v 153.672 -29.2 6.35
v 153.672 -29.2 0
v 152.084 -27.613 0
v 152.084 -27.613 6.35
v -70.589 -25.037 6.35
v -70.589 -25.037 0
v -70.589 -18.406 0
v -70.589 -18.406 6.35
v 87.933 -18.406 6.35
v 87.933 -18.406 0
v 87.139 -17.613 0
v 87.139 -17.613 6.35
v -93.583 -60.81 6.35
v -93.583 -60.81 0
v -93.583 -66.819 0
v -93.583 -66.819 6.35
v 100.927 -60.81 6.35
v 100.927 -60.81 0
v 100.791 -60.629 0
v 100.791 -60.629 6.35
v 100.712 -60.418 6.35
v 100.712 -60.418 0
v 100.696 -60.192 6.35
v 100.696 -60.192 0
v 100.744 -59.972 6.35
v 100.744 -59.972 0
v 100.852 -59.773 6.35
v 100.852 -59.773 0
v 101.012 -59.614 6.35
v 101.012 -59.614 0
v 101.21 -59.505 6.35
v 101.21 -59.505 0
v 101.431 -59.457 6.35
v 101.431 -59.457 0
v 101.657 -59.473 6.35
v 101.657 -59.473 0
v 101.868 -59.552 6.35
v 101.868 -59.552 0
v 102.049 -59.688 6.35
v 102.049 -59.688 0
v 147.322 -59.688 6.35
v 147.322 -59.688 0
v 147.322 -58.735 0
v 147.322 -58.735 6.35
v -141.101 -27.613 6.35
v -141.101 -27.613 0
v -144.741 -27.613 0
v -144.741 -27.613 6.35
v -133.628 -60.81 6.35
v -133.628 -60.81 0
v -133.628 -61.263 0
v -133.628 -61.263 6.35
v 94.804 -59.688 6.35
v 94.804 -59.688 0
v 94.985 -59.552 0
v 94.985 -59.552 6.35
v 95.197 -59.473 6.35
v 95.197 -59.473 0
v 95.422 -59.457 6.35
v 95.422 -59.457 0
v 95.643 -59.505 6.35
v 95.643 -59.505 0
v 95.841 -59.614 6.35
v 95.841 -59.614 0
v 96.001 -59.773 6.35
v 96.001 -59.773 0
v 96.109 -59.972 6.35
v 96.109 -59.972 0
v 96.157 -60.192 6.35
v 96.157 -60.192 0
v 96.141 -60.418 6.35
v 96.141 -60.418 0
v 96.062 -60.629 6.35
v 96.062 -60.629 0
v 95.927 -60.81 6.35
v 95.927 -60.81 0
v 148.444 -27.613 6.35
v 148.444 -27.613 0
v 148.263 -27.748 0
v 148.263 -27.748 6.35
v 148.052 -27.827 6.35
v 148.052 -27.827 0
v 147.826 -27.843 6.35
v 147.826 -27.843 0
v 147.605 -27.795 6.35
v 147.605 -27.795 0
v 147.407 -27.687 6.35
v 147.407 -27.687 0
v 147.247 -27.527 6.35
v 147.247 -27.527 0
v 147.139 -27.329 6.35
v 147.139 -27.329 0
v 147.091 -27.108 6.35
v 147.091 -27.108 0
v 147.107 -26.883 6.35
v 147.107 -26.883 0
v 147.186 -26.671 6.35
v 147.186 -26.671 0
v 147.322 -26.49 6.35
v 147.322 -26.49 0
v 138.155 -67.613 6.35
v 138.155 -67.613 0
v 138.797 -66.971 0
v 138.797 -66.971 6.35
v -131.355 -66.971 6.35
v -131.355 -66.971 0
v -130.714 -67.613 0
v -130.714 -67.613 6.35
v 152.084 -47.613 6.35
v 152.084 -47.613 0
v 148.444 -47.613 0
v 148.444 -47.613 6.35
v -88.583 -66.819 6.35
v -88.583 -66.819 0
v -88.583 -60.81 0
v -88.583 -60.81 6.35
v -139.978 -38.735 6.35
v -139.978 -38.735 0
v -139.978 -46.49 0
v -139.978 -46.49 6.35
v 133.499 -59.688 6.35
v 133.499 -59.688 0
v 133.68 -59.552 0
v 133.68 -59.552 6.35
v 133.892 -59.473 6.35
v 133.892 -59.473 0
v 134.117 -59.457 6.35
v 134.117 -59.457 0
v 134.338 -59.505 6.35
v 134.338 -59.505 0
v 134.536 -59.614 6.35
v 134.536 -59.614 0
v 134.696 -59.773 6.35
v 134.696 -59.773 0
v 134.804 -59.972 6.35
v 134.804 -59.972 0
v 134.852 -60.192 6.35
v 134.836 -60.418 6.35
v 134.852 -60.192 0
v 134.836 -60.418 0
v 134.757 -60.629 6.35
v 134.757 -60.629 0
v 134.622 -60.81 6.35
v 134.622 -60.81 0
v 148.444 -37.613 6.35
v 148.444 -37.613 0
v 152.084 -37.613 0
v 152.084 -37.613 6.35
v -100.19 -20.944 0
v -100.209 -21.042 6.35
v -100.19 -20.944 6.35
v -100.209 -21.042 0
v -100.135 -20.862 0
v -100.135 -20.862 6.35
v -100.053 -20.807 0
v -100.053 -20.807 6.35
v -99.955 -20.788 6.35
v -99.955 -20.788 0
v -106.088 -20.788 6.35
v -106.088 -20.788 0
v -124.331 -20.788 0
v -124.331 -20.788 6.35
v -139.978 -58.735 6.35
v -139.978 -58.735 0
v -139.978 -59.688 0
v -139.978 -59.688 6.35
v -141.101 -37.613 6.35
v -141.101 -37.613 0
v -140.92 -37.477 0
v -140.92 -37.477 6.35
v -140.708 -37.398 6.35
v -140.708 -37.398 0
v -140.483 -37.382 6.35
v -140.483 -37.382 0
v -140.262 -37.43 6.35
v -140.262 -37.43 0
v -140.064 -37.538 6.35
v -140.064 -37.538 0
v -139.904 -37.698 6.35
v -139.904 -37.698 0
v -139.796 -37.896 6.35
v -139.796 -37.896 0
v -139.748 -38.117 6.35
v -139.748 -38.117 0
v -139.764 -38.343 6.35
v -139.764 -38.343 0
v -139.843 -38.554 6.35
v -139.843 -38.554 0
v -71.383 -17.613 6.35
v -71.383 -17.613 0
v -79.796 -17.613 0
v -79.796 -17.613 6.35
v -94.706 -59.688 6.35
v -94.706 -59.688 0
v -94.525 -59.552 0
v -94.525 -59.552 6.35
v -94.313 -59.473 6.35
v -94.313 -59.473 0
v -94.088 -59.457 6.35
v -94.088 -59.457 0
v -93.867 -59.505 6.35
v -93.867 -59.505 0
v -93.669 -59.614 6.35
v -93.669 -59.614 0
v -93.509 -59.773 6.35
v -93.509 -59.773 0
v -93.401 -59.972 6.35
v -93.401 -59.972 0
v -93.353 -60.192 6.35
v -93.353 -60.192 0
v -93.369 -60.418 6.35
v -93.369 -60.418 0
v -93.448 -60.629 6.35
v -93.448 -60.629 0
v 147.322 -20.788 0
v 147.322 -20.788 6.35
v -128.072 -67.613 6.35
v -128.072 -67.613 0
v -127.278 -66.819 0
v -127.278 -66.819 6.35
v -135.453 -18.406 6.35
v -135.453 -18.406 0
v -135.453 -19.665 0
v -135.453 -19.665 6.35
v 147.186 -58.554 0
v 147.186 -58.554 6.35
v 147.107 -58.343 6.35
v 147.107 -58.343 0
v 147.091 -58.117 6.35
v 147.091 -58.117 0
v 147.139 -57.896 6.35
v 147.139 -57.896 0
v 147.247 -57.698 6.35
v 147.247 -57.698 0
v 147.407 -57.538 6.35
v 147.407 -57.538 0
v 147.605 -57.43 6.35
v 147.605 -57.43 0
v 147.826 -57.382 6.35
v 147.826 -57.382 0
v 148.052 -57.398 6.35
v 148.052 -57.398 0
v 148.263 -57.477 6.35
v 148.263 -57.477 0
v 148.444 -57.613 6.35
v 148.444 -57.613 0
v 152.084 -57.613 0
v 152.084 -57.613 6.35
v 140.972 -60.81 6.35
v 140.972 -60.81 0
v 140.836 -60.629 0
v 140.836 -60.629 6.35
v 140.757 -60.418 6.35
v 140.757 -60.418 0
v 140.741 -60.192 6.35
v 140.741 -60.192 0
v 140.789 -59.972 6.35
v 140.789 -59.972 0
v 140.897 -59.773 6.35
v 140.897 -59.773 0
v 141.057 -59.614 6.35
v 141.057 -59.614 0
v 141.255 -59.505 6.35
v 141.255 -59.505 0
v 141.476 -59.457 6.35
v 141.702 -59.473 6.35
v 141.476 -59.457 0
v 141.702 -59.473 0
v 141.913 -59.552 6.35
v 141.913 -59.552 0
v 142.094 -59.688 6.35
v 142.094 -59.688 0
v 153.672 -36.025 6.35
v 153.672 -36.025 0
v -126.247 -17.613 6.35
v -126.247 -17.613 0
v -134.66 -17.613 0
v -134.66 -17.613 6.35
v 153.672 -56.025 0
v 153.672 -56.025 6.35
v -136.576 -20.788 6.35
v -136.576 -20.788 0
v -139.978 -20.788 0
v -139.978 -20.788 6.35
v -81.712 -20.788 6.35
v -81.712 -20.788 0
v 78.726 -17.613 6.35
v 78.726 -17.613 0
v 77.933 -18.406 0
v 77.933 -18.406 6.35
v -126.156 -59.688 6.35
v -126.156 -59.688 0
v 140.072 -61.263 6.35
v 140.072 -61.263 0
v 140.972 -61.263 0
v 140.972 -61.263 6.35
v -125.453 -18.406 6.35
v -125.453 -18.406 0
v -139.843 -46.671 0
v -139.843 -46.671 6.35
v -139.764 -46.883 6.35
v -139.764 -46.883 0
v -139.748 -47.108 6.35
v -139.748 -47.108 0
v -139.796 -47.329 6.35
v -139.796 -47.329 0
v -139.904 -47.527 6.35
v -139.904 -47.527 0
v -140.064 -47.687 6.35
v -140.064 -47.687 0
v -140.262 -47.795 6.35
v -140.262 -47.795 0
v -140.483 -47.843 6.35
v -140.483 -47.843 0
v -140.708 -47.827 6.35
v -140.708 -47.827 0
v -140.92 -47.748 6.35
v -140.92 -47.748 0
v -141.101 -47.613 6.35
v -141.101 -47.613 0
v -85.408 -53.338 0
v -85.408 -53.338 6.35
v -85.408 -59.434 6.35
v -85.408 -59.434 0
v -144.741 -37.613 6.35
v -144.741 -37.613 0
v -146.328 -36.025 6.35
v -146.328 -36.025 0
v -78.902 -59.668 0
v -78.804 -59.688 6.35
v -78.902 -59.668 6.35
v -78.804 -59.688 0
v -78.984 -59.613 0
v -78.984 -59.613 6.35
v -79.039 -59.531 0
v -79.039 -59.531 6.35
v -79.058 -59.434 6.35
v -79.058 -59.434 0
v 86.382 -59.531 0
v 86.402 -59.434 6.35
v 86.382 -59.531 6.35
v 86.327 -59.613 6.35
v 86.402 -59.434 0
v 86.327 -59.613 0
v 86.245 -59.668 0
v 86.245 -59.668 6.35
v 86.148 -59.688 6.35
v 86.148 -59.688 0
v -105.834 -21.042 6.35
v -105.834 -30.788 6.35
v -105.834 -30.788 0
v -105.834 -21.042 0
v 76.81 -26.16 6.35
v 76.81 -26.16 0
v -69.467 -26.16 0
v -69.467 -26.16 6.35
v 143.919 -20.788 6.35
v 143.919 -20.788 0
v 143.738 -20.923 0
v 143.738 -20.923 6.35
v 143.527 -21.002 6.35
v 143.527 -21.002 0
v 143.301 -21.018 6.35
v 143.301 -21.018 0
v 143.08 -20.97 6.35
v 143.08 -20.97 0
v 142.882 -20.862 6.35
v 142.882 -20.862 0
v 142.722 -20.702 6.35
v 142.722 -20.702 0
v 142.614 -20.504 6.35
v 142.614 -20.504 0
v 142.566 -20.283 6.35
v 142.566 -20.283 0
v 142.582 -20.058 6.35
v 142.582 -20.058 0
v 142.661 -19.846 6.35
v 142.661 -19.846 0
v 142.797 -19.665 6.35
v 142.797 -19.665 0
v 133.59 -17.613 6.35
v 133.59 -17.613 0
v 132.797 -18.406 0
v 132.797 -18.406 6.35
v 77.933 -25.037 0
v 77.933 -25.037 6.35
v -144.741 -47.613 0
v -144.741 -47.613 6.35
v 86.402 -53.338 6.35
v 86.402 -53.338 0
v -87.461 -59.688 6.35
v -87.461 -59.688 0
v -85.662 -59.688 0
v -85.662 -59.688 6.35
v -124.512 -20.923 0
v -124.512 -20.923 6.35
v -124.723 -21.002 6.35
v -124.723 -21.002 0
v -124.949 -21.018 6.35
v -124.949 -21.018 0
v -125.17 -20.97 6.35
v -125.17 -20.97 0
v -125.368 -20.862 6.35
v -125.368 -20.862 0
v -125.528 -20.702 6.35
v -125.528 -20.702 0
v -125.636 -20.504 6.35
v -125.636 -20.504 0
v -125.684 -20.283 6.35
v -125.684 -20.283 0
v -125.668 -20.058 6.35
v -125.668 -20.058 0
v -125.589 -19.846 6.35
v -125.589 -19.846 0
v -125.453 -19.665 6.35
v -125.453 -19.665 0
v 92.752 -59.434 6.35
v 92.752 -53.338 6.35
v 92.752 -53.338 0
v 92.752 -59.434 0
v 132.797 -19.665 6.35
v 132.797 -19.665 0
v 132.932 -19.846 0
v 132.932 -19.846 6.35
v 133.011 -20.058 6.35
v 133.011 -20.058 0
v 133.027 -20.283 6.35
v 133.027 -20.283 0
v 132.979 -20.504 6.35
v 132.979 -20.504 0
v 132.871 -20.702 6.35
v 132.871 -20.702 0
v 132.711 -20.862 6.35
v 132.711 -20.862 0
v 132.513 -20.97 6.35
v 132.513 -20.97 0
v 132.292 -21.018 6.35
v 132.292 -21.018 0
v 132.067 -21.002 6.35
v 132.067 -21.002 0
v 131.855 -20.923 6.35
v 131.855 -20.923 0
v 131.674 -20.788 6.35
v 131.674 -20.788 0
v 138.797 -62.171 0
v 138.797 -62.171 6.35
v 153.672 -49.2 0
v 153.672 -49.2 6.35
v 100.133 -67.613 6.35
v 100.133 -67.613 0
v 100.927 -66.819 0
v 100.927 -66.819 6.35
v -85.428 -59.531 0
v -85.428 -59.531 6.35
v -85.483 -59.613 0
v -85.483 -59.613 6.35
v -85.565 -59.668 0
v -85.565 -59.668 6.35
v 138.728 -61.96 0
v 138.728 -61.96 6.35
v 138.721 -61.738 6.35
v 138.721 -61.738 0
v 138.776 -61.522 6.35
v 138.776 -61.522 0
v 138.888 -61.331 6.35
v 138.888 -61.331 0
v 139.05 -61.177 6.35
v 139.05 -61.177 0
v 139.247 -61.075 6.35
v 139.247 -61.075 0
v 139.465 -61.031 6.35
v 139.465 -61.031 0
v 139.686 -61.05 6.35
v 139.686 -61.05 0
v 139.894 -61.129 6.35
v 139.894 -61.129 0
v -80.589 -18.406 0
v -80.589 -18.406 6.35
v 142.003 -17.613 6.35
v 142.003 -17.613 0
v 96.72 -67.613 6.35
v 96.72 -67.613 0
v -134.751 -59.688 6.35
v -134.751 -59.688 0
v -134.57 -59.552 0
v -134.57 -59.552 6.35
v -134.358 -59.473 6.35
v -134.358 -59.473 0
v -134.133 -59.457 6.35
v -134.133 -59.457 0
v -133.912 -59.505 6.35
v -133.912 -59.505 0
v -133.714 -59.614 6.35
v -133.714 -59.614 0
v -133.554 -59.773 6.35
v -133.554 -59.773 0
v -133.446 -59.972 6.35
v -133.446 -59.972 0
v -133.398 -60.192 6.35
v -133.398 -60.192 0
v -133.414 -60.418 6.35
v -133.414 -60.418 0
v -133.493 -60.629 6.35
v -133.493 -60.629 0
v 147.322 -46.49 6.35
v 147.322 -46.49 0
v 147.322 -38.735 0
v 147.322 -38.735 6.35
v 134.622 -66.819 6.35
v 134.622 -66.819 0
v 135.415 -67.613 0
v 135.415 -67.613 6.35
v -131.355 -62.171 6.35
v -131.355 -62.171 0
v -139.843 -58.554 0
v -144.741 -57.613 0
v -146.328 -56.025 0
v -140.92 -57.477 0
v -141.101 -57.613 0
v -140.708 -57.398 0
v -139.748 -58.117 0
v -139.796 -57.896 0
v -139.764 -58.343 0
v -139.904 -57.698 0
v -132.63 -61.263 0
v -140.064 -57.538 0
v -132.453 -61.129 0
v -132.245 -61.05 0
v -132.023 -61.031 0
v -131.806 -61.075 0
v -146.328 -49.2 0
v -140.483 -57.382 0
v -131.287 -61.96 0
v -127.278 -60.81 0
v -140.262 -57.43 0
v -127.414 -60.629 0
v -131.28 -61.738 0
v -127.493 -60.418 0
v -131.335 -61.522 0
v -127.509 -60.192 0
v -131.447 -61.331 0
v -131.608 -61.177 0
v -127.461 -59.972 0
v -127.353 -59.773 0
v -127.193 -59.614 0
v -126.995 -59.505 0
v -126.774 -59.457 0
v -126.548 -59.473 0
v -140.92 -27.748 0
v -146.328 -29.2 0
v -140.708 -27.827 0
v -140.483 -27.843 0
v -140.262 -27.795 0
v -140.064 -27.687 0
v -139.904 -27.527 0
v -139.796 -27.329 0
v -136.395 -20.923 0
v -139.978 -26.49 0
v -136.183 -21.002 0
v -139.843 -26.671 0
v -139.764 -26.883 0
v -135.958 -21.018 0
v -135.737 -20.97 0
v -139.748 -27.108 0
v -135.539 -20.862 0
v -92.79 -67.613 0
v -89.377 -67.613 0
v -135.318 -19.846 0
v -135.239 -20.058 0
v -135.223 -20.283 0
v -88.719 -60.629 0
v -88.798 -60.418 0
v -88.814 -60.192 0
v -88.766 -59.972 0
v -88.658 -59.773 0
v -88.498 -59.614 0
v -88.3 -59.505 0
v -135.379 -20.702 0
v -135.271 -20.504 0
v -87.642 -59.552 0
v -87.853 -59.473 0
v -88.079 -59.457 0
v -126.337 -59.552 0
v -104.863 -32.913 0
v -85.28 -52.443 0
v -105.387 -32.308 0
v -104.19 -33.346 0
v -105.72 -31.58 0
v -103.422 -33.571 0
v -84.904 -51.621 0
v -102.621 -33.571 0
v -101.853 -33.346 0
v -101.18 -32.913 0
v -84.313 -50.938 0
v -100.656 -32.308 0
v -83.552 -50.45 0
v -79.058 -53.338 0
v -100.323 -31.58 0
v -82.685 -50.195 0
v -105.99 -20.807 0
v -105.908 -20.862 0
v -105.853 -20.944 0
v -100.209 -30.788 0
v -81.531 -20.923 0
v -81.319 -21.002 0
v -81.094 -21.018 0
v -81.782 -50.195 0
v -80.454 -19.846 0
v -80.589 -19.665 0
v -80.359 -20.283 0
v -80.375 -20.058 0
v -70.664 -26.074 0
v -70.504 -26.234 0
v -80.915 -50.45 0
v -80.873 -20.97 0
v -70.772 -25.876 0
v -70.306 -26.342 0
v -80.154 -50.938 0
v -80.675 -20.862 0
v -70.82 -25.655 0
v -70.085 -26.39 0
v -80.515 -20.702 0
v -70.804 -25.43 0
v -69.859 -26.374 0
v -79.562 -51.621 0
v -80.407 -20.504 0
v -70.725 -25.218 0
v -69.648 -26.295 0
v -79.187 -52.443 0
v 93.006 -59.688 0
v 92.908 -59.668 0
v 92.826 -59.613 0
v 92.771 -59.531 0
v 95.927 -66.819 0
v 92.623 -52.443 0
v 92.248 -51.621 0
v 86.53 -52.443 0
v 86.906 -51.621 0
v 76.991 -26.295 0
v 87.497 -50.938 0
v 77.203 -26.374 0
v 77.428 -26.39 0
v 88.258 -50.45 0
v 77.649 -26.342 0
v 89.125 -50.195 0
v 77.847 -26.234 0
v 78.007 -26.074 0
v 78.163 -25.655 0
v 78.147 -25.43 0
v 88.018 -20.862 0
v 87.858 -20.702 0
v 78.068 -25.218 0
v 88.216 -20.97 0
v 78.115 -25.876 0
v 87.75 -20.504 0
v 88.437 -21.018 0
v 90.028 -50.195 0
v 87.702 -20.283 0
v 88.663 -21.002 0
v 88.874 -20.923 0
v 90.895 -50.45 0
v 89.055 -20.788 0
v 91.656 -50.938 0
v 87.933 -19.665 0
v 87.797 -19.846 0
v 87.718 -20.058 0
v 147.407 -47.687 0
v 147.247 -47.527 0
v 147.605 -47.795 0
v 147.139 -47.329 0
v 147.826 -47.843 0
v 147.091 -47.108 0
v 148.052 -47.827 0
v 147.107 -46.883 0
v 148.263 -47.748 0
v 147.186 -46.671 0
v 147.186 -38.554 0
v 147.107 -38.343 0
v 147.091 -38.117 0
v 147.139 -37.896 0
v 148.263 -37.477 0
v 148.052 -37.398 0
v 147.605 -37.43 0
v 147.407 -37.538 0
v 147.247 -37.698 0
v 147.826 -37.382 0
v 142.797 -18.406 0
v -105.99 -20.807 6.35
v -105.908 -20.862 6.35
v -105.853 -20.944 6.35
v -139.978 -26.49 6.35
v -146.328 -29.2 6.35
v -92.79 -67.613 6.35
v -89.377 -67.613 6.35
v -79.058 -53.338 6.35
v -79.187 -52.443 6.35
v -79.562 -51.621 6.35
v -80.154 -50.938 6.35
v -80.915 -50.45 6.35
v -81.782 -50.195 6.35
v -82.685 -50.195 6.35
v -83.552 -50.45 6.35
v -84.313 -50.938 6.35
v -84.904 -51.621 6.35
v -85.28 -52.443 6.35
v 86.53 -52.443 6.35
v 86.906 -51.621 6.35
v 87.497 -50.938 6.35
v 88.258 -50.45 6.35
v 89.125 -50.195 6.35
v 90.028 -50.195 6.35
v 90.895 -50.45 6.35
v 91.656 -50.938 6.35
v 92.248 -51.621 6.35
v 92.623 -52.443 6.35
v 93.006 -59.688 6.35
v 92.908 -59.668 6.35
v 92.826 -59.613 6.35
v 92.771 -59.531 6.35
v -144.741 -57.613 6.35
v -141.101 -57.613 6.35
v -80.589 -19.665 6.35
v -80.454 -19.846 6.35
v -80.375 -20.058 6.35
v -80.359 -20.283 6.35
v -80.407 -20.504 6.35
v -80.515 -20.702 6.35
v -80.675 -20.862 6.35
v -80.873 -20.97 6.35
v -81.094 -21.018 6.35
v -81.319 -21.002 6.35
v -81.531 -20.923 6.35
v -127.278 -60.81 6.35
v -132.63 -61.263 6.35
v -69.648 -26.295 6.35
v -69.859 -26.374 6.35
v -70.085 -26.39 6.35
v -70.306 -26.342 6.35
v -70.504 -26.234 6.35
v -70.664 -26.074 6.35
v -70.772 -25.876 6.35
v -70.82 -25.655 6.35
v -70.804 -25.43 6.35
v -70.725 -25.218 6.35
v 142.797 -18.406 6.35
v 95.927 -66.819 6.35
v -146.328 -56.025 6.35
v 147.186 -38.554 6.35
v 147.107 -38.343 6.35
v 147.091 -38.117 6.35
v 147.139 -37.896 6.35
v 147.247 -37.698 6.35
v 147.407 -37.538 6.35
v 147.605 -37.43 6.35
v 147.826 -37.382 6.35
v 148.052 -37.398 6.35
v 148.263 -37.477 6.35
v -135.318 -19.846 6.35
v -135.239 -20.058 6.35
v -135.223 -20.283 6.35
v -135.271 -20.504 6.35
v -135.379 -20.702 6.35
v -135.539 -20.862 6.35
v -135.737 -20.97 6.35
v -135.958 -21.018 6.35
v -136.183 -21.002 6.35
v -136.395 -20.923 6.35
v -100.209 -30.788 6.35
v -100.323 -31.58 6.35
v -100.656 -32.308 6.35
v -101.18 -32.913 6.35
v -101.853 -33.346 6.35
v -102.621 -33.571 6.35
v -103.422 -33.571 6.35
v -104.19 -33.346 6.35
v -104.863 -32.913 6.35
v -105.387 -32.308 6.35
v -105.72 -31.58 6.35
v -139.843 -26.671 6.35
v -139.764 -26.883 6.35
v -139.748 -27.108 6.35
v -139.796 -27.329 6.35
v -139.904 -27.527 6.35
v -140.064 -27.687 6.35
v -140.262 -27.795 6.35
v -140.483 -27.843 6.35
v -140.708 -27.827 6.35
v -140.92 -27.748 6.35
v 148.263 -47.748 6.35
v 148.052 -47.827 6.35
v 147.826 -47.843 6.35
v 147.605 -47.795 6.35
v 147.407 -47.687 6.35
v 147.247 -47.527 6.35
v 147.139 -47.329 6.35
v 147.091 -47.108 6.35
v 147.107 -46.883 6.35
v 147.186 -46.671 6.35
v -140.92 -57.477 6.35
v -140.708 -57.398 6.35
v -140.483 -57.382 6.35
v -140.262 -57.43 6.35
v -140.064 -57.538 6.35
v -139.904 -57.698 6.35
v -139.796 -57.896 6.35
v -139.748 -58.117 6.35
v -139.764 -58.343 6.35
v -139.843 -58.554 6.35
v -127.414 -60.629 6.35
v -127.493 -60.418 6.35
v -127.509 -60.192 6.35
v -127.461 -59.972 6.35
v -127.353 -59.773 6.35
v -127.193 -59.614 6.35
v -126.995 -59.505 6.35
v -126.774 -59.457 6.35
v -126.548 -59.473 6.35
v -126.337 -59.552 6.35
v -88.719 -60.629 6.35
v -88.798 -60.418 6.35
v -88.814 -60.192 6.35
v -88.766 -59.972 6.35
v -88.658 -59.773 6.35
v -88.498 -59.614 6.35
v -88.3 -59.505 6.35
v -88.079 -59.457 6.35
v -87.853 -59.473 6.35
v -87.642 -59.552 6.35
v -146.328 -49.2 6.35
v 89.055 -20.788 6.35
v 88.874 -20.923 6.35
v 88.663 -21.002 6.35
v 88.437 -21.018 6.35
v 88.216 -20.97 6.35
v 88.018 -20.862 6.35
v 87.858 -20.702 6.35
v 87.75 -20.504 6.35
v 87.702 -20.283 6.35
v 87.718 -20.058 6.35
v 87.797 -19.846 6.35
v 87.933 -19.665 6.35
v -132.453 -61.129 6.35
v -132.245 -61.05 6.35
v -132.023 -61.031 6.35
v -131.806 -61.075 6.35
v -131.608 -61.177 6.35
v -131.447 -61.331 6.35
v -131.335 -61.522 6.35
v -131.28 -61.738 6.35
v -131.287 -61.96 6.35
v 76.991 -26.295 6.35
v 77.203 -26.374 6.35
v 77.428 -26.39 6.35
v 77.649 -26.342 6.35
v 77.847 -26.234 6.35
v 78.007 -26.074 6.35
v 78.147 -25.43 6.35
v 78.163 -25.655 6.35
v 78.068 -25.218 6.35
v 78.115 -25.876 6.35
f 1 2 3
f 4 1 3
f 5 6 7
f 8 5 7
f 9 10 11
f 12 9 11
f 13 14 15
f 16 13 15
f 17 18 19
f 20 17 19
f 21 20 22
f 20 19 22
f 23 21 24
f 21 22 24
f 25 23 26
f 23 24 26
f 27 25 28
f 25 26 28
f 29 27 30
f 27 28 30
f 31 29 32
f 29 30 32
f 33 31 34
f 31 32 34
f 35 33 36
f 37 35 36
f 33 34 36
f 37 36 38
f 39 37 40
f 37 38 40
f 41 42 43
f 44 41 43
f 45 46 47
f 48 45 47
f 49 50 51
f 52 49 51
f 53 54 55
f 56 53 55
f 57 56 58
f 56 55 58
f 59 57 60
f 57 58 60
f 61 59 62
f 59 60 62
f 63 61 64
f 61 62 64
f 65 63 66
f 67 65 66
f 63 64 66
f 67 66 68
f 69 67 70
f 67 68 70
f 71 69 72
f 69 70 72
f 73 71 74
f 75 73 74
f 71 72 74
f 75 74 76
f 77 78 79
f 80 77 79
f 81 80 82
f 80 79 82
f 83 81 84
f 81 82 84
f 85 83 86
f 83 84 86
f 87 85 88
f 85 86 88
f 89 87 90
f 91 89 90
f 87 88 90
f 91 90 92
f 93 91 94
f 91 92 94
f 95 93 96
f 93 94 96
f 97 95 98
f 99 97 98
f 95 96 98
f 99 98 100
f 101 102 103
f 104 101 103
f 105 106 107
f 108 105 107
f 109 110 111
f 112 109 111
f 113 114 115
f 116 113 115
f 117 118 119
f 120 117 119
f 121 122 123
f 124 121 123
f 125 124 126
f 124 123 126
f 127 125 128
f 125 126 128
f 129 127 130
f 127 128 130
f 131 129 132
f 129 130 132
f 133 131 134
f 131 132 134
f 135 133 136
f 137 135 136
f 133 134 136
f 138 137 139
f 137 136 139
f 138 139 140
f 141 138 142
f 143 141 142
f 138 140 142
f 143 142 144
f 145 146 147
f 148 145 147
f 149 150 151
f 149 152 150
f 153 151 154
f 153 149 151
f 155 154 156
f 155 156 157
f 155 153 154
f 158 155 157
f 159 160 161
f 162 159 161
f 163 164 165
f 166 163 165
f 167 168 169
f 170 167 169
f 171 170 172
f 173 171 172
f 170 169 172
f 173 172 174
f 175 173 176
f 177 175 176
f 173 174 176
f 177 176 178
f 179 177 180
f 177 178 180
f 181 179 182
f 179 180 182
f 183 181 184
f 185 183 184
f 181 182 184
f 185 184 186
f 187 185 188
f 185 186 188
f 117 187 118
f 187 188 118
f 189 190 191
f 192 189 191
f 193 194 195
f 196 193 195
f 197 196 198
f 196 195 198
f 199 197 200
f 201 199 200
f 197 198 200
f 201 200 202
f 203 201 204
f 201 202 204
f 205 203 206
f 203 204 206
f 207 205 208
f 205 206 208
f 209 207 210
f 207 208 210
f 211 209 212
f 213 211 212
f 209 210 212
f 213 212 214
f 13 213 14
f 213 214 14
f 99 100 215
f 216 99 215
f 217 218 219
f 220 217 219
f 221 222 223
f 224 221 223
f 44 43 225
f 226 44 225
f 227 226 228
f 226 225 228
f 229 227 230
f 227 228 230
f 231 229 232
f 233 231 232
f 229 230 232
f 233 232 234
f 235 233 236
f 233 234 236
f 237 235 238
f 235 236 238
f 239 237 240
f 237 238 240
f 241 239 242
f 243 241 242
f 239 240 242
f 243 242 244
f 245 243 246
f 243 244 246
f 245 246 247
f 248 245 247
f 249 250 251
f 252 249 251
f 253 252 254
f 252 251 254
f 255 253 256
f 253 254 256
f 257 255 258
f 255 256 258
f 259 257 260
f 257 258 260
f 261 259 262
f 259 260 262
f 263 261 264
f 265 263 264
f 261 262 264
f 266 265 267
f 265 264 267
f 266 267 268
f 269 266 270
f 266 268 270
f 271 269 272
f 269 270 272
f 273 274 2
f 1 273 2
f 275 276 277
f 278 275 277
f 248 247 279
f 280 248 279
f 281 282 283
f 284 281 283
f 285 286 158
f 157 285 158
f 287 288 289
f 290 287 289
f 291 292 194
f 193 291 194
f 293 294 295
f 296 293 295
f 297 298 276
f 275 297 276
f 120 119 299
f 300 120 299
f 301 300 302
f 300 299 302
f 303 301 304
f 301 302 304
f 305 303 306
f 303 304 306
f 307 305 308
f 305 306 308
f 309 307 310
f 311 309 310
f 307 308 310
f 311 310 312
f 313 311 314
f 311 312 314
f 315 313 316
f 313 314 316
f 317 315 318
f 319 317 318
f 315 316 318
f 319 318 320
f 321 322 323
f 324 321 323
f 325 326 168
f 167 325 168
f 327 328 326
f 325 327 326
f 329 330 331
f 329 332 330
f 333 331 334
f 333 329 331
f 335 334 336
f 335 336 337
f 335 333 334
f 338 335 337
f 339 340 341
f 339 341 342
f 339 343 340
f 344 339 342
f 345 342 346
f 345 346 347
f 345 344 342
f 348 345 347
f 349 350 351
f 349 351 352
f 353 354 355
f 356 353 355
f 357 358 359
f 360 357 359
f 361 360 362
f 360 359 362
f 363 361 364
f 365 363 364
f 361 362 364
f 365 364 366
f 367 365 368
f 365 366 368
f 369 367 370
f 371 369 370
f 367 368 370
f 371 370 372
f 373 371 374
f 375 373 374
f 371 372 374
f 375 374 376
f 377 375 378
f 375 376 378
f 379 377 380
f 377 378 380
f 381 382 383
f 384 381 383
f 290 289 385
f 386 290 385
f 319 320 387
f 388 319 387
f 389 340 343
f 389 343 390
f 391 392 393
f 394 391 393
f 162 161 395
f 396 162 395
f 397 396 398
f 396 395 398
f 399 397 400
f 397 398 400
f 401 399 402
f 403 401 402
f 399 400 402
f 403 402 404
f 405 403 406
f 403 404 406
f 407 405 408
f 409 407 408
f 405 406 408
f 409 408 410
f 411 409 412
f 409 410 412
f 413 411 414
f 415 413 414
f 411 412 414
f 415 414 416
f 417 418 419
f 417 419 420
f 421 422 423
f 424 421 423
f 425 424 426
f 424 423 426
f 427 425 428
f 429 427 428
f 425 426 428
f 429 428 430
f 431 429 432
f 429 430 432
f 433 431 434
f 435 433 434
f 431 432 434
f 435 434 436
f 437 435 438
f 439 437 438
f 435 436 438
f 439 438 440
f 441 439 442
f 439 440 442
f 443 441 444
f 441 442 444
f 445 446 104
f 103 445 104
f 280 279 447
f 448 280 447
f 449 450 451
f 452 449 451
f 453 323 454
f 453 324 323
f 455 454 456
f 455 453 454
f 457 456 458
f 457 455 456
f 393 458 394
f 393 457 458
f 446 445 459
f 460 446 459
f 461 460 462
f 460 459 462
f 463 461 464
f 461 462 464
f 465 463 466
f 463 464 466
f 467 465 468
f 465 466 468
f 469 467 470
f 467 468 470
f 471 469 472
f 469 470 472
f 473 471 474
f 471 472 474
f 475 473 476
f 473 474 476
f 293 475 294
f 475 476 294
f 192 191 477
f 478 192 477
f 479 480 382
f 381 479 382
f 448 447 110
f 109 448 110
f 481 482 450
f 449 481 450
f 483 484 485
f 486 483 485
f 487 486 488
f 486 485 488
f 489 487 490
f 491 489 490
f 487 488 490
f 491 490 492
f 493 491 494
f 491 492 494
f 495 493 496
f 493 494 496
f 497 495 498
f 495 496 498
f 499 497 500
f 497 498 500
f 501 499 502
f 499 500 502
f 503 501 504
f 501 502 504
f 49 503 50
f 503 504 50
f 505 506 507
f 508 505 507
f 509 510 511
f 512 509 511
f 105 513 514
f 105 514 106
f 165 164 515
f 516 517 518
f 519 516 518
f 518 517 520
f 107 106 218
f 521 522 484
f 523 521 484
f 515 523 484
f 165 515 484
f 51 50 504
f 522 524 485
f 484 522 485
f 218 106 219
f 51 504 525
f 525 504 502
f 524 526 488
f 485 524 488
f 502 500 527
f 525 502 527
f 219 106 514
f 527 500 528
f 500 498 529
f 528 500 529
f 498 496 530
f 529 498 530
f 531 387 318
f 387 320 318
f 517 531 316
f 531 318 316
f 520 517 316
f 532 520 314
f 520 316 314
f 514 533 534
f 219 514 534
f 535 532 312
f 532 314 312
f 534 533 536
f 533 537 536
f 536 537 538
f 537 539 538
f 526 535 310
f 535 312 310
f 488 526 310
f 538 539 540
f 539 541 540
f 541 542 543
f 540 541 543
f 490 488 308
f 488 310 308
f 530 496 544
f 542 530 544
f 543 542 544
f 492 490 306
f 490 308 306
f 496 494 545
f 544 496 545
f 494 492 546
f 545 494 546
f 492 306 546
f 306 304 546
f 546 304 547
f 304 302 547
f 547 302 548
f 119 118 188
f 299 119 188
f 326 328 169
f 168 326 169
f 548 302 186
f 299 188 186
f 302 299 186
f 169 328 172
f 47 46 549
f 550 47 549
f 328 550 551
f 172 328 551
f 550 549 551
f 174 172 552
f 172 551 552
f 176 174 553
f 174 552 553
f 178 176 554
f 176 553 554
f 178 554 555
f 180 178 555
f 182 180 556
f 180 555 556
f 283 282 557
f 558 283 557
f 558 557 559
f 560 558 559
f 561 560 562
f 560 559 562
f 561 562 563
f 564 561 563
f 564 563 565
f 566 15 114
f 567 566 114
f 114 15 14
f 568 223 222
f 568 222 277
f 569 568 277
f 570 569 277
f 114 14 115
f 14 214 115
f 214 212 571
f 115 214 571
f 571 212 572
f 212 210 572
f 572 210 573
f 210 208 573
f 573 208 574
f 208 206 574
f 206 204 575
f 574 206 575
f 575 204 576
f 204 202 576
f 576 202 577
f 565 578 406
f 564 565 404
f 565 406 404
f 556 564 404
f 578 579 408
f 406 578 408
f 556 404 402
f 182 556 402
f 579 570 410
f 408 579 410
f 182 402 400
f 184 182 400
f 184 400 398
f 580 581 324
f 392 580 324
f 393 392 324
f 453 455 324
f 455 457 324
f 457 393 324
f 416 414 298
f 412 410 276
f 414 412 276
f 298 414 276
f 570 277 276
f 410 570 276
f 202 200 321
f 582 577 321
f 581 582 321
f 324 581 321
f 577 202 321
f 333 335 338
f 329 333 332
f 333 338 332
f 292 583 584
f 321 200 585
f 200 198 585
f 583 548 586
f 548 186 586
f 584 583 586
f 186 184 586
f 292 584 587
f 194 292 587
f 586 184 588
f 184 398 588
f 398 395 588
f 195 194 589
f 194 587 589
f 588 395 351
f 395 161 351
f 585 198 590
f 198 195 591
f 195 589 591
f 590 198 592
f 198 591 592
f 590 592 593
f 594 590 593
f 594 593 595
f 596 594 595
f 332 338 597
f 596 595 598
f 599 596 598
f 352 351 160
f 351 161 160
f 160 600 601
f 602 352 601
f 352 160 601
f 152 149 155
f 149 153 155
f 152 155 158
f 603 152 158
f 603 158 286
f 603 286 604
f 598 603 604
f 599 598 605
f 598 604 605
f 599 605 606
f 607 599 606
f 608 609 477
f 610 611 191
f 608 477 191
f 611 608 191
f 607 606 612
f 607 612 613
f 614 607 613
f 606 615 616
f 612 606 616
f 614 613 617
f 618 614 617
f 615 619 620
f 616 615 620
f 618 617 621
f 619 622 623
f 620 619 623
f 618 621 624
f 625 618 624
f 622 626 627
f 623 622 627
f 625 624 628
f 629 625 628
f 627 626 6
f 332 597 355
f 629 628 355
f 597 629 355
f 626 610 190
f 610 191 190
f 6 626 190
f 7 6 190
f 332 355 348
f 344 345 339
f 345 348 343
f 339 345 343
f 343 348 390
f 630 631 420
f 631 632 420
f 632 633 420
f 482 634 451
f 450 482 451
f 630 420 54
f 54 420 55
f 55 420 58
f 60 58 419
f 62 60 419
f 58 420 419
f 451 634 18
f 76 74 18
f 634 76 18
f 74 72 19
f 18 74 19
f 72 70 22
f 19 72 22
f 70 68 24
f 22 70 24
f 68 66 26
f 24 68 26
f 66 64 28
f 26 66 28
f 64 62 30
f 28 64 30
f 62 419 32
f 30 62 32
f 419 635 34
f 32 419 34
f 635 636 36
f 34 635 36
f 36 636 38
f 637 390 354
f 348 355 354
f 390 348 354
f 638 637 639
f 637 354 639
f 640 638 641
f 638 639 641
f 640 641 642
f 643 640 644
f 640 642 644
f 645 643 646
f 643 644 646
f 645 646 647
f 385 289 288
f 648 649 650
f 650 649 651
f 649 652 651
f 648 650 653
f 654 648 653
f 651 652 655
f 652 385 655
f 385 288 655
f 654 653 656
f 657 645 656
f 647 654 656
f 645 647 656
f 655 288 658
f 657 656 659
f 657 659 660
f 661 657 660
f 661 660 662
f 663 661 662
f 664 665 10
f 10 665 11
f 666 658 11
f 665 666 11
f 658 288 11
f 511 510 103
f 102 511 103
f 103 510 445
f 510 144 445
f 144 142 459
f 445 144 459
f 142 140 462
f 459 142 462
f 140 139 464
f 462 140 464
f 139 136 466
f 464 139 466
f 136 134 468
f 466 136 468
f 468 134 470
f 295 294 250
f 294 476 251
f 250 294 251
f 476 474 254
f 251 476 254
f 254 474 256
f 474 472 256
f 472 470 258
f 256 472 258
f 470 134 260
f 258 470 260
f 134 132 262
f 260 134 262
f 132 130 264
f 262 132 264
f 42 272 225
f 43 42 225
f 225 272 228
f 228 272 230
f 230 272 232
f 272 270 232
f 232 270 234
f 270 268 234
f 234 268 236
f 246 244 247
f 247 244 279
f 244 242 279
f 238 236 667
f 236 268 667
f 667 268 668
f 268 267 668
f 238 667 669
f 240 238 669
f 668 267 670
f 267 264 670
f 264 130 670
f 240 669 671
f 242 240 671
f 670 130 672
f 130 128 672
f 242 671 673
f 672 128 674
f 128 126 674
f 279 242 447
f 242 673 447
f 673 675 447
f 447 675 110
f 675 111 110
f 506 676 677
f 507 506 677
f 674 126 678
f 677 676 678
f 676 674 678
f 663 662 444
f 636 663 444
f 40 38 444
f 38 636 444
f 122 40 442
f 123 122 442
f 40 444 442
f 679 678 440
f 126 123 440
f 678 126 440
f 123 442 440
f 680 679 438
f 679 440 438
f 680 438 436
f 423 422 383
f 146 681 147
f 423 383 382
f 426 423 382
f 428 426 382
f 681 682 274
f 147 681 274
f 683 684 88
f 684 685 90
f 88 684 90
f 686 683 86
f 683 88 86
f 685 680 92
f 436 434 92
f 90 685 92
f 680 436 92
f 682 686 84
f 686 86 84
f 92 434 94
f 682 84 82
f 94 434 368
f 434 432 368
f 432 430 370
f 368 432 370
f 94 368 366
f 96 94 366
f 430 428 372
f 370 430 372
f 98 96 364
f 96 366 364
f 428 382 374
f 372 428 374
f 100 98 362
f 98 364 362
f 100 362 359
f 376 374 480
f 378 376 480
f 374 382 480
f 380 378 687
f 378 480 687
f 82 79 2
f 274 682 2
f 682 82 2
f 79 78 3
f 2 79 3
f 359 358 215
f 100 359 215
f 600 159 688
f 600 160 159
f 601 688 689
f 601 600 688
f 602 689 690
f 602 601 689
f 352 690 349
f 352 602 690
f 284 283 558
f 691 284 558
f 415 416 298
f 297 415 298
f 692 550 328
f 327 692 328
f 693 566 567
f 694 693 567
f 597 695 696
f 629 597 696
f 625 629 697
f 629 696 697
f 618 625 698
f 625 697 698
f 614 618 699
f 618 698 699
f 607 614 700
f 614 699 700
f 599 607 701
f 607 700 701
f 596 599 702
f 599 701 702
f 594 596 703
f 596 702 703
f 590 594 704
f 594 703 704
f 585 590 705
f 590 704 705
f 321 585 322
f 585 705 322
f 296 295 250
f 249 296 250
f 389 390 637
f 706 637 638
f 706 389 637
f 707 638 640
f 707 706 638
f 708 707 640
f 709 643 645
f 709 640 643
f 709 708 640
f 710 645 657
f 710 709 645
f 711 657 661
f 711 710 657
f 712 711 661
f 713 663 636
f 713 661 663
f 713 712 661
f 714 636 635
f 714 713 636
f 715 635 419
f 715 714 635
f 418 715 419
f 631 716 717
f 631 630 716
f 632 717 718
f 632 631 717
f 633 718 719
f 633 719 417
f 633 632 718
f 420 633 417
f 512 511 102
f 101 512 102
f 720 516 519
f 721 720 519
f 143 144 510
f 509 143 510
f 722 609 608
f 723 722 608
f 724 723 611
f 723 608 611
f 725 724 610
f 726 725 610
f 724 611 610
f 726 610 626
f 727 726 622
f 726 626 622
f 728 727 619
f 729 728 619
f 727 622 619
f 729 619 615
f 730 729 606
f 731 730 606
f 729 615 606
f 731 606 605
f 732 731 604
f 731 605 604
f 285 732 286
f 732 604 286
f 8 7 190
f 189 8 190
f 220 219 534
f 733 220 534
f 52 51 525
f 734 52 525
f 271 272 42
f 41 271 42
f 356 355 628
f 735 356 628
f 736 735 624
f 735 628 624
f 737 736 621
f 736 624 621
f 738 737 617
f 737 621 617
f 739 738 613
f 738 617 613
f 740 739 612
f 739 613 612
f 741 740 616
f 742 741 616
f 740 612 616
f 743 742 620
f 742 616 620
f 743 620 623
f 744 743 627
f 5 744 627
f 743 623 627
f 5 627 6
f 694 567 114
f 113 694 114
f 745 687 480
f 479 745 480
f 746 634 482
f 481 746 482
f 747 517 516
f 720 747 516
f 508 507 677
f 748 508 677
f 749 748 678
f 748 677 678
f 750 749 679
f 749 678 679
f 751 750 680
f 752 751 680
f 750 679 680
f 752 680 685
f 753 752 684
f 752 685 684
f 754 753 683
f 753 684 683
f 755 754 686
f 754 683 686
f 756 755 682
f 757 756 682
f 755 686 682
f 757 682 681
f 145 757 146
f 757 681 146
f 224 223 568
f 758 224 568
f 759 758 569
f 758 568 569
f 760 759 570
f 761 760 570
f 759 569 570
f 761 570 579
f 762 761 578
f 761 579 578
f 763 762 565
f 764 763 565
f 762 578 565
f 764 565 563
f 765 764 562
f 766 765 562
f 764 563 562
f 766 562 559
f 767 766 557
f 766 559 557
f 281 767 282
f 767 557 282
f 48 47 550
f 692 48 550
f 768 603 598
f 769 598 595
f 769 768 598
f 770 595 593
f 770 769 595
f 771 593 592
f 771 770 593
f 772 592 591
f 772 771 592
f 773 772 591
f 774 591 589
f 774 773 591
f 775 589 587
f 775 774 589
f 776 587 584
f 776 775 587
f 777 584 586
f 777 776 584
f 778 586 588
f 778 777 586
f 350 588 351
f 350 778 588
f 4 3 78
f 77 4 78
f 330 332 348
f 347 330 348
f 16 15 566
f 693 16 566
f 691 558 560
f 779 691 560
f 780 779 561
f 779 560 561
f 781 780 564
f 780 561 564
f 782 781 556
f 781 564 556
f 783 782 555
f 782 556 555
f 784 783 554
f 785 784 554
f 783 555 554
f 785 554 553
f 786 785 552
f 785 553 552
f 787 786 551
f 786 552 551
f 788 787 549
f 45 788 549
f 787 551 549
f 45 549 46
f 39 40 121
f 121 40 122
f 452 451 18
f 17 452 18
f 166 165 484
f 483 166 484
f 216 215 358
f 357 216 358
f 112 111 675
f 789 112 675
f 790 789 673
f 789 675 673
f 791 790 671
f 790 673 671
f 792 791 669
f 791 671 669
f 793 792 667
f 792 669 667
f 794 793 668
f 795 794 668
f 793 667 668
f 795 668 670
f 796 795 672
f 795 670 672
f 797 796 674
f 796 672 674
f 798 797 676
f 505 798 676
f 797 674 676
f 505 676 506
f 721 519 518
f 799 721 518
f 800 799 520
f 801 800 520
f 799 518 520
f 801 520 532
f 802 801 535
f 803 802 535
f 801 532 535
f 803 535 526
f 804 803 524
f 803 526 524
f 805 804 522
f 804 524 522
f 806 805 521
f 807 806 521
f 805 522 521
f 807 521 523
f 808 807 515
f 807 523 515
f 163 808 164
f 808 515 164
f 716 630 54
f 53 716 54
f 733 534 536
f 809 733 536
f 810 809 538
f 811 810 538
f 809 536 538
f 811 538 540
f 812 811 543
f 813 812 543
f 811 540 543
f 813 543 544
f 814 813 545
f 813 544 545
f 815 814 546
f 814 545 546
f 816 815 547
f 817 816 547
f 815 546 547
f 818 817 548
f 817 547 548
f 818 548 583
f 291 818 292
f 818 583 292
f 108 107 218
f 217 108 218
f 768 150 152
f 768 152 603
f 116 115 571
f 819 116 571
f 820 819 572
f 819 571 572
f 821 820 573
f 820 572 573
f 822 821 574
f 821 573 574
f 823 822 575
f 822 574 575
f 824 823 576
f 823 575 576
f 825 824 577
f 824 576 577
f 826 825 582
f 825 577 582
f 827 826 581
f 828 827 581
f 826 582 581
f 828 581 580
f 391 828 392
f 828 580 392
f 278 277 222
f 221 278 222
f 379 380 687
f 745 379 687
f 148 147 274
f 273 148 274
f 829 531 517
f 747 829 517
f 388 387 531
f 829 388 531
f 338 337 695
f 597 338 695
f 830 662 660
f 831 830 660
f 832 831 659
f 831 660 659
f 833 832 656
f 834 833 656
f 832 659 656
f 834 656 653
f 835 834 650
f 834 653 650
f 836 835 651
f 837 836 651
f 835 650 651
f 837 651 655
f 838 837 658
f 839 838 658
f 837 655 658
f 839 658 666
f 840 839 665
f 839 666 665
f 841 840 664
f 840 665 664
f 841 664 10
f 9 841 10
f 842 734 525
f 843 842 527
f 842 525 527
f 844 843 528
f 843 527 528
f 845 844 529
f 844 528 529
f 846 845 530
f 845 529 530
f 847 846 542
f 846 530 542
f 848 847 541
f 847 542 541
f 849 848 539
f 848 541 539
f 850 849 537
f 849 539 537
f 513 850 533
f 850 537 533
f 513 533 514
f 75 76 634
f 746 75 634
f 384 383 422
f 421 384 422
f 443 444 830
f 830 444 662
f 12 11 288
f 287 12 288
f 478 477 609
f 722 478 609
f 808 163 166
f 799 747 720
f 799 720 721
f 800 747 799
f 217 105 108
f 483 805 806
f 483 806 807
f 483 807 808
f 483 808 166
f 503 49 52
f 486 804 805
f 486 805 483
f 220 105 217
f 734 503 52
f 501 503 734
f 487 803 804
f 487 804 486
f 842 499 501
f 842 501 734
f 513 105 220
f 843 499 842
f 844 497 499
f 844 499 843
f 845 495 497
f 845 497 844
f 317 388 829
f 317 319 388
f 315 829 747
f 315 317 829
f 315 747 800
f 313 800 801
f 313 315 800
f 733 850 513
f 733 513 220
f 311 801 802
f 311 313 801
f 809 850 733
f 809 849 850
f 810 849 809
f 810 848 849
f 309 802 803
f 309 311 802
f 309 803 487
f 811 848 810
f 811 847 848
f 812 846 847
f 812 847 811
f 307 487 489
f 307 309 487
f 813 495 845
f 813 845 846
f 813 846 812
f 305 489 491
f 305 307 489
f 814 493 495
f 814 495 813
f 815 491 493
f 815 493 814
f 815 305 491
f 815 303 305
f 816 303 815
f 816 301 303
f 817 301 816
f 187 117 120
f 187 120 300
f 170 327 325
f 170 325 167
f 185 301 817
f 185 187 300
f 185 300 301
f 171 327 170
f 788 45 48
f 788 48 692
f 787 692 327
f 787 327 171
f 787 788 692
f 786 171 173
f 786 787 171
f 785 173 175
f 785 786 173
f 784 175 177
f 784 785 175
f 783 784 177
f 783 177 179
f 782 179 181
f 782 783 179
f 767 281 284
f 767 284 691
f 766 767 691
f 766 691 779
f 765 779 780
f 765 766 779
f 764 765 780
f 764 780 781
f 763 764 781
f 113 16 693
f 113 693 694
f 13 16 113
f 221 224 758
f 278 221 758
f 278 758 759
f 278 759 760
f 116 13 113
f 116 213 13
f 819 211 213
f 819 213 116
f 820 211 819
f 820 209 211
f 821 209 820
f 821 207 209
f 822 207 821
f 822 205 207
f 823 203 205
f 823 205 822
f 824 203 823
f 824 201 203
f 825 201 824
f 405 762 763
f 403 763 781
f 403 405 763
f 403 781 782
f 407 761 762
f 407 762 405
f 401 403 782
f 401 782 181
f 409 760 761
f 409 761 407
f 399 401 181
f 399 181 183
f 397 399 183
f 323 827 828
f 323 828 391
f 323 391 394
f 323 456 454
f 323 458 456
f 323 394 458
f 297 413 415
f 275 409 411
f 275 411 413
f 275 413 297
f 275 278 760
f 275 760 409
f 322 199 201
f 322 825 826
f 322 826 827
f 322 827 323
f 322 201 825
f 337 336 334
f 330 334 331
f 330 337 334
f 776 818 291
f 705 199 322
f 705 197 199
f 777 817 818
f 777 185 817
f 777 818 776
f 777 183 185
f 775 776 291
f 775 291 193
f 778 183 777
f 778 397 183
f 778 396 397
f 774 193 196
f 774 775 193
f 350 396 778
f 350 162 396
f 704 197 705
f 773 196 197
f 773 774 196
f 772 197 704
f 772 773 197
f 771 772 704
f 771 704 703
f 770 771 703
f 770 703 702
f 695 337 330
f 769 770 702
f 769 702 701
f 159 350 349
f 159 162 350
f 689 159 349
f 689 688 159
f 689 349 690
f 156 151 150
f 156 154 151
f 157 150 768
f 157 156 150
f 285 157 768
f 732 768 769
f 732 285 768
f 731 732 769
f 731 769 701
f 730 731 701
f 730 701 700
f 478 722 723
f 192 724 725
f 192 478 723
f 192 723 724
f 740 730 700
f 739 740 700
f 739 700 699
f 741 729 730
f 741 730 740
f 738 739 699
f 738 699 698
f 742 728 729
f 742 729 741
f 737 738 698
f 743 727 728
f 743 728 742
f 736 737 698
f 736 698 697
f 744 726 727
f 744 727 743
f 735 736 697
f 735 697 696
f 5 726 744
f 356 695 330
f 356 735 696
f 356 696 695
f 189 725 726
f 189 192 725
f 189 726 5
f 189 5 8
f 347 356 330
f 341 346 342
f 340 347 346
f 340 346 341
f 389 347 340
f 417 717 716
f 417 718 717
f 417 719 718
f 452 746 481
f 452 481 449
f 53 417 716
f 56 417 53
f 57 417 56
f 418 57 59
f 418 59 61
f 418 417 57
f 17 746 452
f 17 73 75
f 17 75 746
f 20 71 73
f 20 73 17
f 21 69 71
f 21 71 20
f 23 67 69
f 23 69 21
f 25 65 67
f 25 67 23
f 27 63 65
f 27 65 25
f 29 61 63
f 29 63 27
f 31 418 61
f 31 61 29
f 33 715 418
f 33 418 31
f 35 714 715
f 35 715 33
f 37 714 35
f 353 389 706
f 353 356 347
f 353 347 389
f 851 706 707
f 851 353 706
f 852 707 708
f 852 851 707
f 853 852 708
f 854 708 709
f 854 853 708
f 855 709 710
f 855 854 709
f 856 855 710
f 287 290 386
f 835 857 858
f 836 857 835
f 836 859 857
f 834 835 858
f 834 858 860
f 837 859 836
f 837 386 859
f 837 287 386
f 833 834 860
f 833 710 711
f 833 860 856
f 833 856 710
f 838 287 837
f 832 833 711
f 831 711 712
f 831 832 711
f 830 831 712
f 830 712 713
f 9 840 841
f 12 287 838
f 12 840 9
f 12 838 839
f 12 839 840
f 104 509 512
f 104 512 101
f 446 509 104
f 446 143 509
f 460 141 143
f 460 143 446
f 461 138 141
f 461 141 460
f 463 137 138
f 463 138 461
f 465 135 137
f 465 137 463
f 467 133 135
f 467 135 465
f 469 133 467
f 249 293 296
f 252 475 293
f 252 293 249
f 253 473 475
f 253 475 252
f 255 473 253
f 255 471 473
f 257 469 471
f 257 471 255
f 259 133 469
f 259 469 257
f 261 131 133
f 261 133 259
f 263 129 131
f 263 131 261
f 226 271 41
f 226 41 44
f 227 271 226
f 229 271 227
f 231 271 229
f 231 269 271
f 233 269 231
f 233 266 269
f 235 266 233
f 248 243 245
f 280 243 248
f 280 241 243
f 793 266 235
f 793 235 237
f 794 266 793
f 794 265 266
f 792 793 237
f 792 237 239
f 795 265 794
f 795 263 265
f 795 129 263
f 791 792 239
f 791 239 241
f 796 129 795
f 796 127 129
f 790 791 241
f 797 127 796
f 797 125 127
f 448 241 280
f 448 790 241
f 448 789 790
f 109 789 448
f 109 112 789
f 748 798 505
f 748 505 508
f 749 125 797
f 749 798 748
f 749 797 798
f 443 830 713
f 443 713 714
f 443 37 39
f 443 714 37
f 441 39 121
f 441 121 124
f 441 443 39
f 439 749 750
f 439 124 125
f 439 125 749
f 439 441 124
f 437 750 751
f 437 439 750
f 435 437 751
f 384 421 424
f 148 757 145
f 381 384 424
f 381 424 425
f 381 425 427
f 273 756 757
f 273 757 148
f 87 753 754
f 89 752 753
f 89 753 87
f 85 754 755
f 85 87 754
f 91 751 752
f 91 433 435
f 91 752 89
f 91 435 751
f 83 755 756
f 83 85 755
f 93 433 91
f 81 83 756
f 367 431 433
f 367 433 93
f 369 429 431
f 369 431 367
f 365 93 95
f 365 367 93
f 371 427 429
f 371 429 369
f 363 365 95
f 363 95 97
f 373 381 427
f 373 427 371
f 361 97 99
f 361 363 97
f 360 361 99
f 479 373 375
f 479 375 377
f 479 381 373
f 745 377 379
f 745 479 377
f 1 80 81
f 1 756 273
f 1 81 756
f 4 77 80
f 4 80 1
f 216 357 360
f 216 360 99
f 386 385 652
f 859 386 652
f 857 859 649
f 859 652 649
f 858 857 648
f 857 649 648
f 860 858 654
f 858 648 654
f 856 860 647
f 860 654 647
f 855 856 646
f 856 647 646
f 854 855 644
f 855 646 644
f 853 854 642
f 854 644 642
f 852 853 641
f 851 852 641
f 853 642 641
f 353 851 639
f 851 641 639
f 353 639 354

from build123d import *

# Parameters (mm, degrees)
BOSS_EXTRUDE1_DEPTH = 6.35
CUT_EXTRUDE2_DEPTH  = 169.008101823
CUT_EXTRUDE3_DEPTH  = 169.008101823
CUT_EXTRUDE4_DEPTH  = 169.008101823
FILLET1_R           = 0.254


with BuildPart() as part:
    # Model → Boss-Extrude1 (new body)
    with BuildSketch(Plane.XY):
        with BuildLine():
            Line((138.15521867, -67.612541882), (138.94896867, -66.818791882))
            Line((138.94896867, -66.818791882), (138.94896867, -62.385073899))
            ThreePointArc((138.94896867, -62.385073899), (138.948968669, -61.262541883), (140.071500684, -61.262541882))
            Line((140.071500684, -61.262541882), (140.971545702, -61.262541882))
            Line((140.971545702, -61.262541882), (140.971545702, -60.810273899))
            ThreePointArc((140.971545702, -60.810273899), (140.9715457, -59.687741883), (142.094077716, -59.687741882))
            Line((142.094077716, -59.687741882), (147.321545702, -59.687741882))
            Line((147.321545702, -59.687741882), (147.321545702, -58.735073899))
            ThreePointArc((147.321545702, -58.735073899), (147.3215457, -57.612541883), (148.444077716, -57.612541882))
            Line((148.444077716, -57.612541882), (152.084045702, -57.612541882))
            Line((152.084045702, -57.612541882), (153.671545702, -56.025041882))
            Line((153.671545702, -56.025041882), (153.671545702, -49.200041882))
            Line((153.671545702, -49.200041882), (152.084045702, -47.612541882))
            Line((152.084045702, -47.612541882), (148.444077716, -47.612541882))
            ThreePointArc((148.444077716, -47.612541882), (147.321545702, -47.612541882), (147.321545702, -46.490009867))
            Line((147.321545702, -46.490009867), (147.321545702, -38.735073899))
            ThreePointArc((147.321545702, -38.735073899), (147.3215457, -37.612541883), (148.444077716, -37.612541882))
            Line((148.444077716, -37.612541882), (152.084045702, -37.612541882))
            Line((152.084045702, -37.612541882), (153.671545702, -36.025041882))
            Line((153.671545702, -36.025041882), (153.671545702, -29.200041882))
            Line((153.671545702, -29.200041882), (152.084045702, -27.612541882))
            Line((152.084045702, -27.612541882), (148.444077716, -27.612541882))
            ThreePointArc((148.444077716, -27.612541882), (147.321545702, -27.612541882), (147.321545702, -26.490009867))
            Line((147.321545702, -26.490009867), (147.321545702, -20.787541882))
            Line((147.321545702, -20.787541882), (143.919077716, -20.787541882))
            ThreePointArc((143.919077716, -20.787541882), (142.796545702, -20.787541882), (142.796545702, -19.665009867))
            Line((142.796545702, -19.665009867), (142.796545702, -18.406291882))
            Line((142.796545702, -18.406291882), (142.002795702, -17.612541882))
            Line((142.002795702, -17.612541882), (133.590295702, -17.612541882))
            Line((133.590295702, -17.612541882), (132.796545702, -18.406291882))
            Line((132.796545702, -18.406291882), (132.796545702, -19.665009867))
            ThreePointArc((132.796545702, -19.665009867), (132.796545702, -20.787541882), (131.674013687, -20.787541882))
            Line((131.674013687, -20.787541882), (89.055077716, -20.787541882))
            ThreePointArc((89.055077716, -20.787541882), (87.932545702, -20.787541882), (87.932545702, -19.665009867))
            Line((87.932545702, -19.665009867), (87.932545702, -18.406291882))
            Line((87.932545702, -18.406291882), (87.138795702, -17.612541882))
            Line((87.138795702, -17.612541882), (78.726295702, -17.612541882))
            Line((78.726295702, -17.612541882), (77.932545702, -18.406291882))
            Line((77.932545702, -18.406291882), (77.932545702, -25.037209867))
            ThreePointArc((77.932545702, -25.037209867), (77.932545702, -26.159741882), (76.810013687, -26.159741882))
            Line((76.810013687, -26.159741882), (-69.46692228, -26.159741882))
            ThreePointArc((-69.46692228, -26.159741882), (-70.589454296, -26.159741883), (-70.589454297, -25.037209867))
            Line((-70.589454297, -25.037209867), (-70.589454297, -18.406291882))
            Line((-70.589454297, -18.406291882), (-71.383204297, -17.612541882))
            Line((-71.383204297, -17.612541882), (-79.795704297, -17.612541882))
            Line((-79.795704297, -17.612541882), (-80.589454297, -18.406291882))
            Line((-80.589454297, -18.406291882), (-80.589454297, -19.665009867))
            ThreePointArc((-80.589454297, -19.665009867), (-80.589454297, -20.787541882), (-81.711986312, -20.787541882))
            Line((-81.711986312, -20.787541882), (-100.521454296, -20.787541882))
            Line((-100.521454296, -20.787541882), (-100.521454296, -29.665009867))
            ThreePointArc((-100.521454296, -29.665009867), (-100.521454296, -30.787541882), (-101.64398631, -30.787541882))
            Line((-101.64398631, -30.787541882), (-104.398922281, -30.787541882))
            ThreePointArc((-104.398922281, -30.787541882), (-105.521454296, -30.787541882), (-105.521454296, -29.665009867))
            Line((-105.521454296, -29.665009867), (-105.521454296, -20.787541882))
            Line((-105.521454296, -20.787541882), (-124.33092228, -20.787541882))
            ThreePointArc((-124.33092228, -20.787541882), (-125.453454296, -20.787541883), (-125.453454297, -19.665009867))
            Line((-125.453454297, -19.665009867), (-125.453454297, -18.406291882))
            Line((-125.453454297, -18.406291882), (-126.247204297, -17.612541882))
            Line((-126.247204297, -17.612541882), (-134.659704297, -17.612541882))
            Line((-134.659704297, -17.612541882), (-135.453454297, -18.406291882))
            Line((-135.453454297, -18.406291882), (-135.453454297, -19.665009867))
            ThreePointArc((-135.453454297, -19.665009867), (-135.453454297, -20.787541882), (-136.575986312, -20.787541882))
            Line((-136.575986312, -20.787541882), (-139.978454297, -20.787541882))
            Line((-139.978454297, -20.787541882), (-139.978454297, -26.490009867))
            ThreePointArc((-139.978454297, -26.490009867), (-139.978454297, -27.612541882), (-141.100986312, -27.612541882))
            Line((-141.100986312, -27.612541882), (-144.740954297, -27.612541882))
            Line((-144.740954297, -27.612541882), (-146.328454297, -29.200041882))
            Line((-146.328454297, -29.200041882), (-146.328454297, -36.025041882))
            Line((-146.328454297, -36.025041882), (-144.740954297, -37.612541882))
            Line((-144.740954297, -37.612541882), (-141.100986312, -37.612541882))
            ThreePointArc((-141.100986312, -37.612541882), (-139.978454296, -37.612541883), (-139.978454297, -38.735073899))
            Line((-139.978454297, -38.735073899), (-139.978454297, -46.490009867))
            ThreePointArc((-139.978454297, -46.490009867), (-139.978454297, -47.612541882), (-141.100986312, -47.612541882))
            Line((-141.100986312, -47.612541882), (-144.740954297, -47.612541882))
            Line((-144.740954297, -47.612541882), (-146.328454297, -49.200041882))
            Line((-146.328454297, -49.200041882), (-146.328454297, -56.025041882))
            Line((-146.328454297, -56.025041882), (-144.740954297, -57.612541882))
            Line((-144.740954297, -57.612541882), (-141.100986312, -57.612541882))
            ThreePointArc((-141.100986312, -57.612541882), (-139.978454296, -57.612541883), (-139.978454297, -58.735073899))
            Line((-139.978454297, -58.735073899), (-139.978454297, -59.687741882))
            Line((-139.978454297, -59.687741882), (-134.750986312, -59.687741882))
            ThreePointArc((-134.750986312, -59.687741882), (-133.628454296, -59.687741883), (-133.628454297, -60.810273899))
            Line((-133.628454297, -60.810273899), (-133.628454297, -61.262541882))
            Line((-133.628454297, -61.262541882), (-132.630226339, -61.262541882))
            ThreePointArc((-132.630226339, -61.262541882), (-131.507694322, -61.262541882), (-131.507694322, -62.385073899))
            Line((-131.507694322, -62.385073899), (-131.507694322, -66.818791882))
            Line((-131.507694322, -66.818791882), (-130.713944322, -67.612541882))
            Line((-130.713944322, -67.612541882), (-128.072204297, -67.612541882))
            Line((-128.072204297, -67.612541882), (-127.278454297, -66.818791882))
            Line((-127.278454297, -66.818791882), (-127.278454297, -60.810273899))
            ThreePointArc((-127.278454297, -60.810273899), (-127.278454298, -59.687741883), (-126.155922283, -59.687741882))
            Line((-126.155922283, -59.687741882), (-94.70598631, -59.687741882))
            ThreePointArc((-94.70598631, -59.687741882), (-93.583454294, -59.687741883), (-93.583454296, -60.810273899))
            Line((-93.583454296, -60.810273899), (-93.583454296, -66.818791882))
            Line((-93.583454296, -66.818791882), (-92.789704296, -67.612541882))
            Line((-92.789704296, -67.612541882), (-89.377204296, -67.612541882))
            Line((-89.377204296, -67.612541882), (-88.583454296, -66.818791882))
            Line((-88.583454296, -66.818791882), (-88.583454296, -60.810273899))
            ThreePointArc((-88.583454296, -60.810273899), (-88.583454297, -59.687741883), (-87.460922281, -59.687741882))
            Line((-87.460922281, -59.687741882), (94.804013689, -59.687741882))
            ThreePointArc((94.804013689, -59.687741882), (95.926545704, -59.687741883), (95.926545703, -60.810273899))
            Line((95.926545703, -60.810273899), (95.926545703, -66.818791882))
            Line((95.926545703, -66.818791882), (96.720295703, -67.612541882))
            Line((96.720295703, -67.612541882), (100.132795703, -67.612541882))
            Line((100.132795703, -67.612541882), (100.926545703, -66.818791882))
            Line((100.926545703, -66.818791882), (100.926545703, -60.810273899))
            ThreePointArc((100.926545703, -60.810273899), (100.926545702, -59.687741883), (102.049077718, -59.687741882))
            Line((102.049077718, -59.687741882), (133.499013687, -59.687741882))
            ThreePointArc((133.499013687, -59.687741882), (134.621545703, -59.687741883), (134.621545702, -60.810273899))
            Line((134.621545702, -60.810273899), (134.621545702, -66.818791882))
            Line((134.621545702, -66.818791882), (135.415295702, -67.612541882))
            Line((135.415295702, -67.612541882), (138.15521867, -67.612541882))
        make_face()
    extrude(amount=BOSS_EXTRUDE1_DEPTH)

    # Sketch3 → Cut-Extrude2 (cut, through all)
    with BuildSketch(Plane.XY.offset(6.35)):
        with BuildLine():
            Line((-131.355294322, -62.171255574), (-131.355294322, -66.971191882))
            Line((-131.355294322, -66.971191882), (-131.507694322, -66.818791882))
            Line((-131.507694322, -66.818791882), (-131.507694322, -62.385073899))
            ThreePointArc((-131.507694322, -62.385073899), (-131.422591643, -62.284510162), (-131.355294322, -62.171255574))
        make_face()
        with BuildLine():
            Line((138.79656867, -62.171255574), (138.79656867, -66.971191882))
            Line((138.79656867, -66.971191882), (138.94896867, -66.818791882))
            Line((138.94896867, -66.818791882), (138.94896867, -62.385073899))
            ThreePointArc((138.94896867, -62.385073899), (138.86386599, -62.284510163), (138.79656867, -62.171255574))
        make_face()
    extrude(amount=-CUT_EXTRUDE2_DEPTH, mode=Mode.SUBTRACT)

    # Sketch4 → Cut-Extrude3 (cut, through all)
    with BuildSketch(Plane.XY.offset(6.35)):
        with BuildLine():
            Line((-85.408454296, -59.687741882), (-79.058454296, -59.687741882))
            Line((-79.058454296, -59.687741882), (-79.058454296, -53.337741882))
            ThreePointArc((-79.058454296, -53.337741882), (-82.233454296, -50.162741882), (-85.408454296, -53.337741882))
            Line((-85.408454296, -53.337741882), (-85.408454296, -59.687741882))
        make_face()
        with BuildLine():
            Line((86.4015457, -59.687741882), (86.4015457, -53.337741882))
            ThreePointArc((86.4015457, -53.337741882), (89.5765457, -50.162741882), (92.751545701, -53.337741882))
            Line((92.751545701, -53.337741882), (92.751545701, -59.687741882))
            Line((92.751545701, -59.687741882), (86.4015457, -59.687741882))
        make_face()
    extrude(amount=-CUT_EXTRUDE3_DEPTH, mode=Mode.SUBTRACT)

    # Sketch6 → Cut-Extrude4 (cut, through all)
    with BuildSketch(Plane.XY.offset(6.35)):
        with BuildLine():
            Line((-105.833547434, -30.787541882), (-105.833547434, -20.787541882))
            Line((-105.833547434, -20.787541882), (-100.209361158, -20.787541882))
            Line((-100.209361158, -20.787541882), (-100.209361158, -30.787541882))
            ThreePointArc((-100.209361158, -30.787541882), (-103.021454296, -33.59963502), (-105.833547434, -30.787541882))
        make_face()
    extrude(amount=-CUT_EXTRUDE4_DEPTH, mode=Mode.SUBTRACT)

    # Fillet1
    fillet1_edges = [part.edges().sort_by_distance(p)[0] for p in [
        (-85.408454296, -59.687741882, 3.175),
        (-79.058454296, -59.687741882, 3.175),
        (92.751545701, -59.687741882, 3.175),
        (86.4015457, -59.687741882, 3.175),
        (-105.833547434, -20.787541882, 3.175),
        (-100.209361158, -20.787541882, 3.175),
    ]]
    fillet(fillet1_edges, radius=FILLET1_R)


solid = part.part
